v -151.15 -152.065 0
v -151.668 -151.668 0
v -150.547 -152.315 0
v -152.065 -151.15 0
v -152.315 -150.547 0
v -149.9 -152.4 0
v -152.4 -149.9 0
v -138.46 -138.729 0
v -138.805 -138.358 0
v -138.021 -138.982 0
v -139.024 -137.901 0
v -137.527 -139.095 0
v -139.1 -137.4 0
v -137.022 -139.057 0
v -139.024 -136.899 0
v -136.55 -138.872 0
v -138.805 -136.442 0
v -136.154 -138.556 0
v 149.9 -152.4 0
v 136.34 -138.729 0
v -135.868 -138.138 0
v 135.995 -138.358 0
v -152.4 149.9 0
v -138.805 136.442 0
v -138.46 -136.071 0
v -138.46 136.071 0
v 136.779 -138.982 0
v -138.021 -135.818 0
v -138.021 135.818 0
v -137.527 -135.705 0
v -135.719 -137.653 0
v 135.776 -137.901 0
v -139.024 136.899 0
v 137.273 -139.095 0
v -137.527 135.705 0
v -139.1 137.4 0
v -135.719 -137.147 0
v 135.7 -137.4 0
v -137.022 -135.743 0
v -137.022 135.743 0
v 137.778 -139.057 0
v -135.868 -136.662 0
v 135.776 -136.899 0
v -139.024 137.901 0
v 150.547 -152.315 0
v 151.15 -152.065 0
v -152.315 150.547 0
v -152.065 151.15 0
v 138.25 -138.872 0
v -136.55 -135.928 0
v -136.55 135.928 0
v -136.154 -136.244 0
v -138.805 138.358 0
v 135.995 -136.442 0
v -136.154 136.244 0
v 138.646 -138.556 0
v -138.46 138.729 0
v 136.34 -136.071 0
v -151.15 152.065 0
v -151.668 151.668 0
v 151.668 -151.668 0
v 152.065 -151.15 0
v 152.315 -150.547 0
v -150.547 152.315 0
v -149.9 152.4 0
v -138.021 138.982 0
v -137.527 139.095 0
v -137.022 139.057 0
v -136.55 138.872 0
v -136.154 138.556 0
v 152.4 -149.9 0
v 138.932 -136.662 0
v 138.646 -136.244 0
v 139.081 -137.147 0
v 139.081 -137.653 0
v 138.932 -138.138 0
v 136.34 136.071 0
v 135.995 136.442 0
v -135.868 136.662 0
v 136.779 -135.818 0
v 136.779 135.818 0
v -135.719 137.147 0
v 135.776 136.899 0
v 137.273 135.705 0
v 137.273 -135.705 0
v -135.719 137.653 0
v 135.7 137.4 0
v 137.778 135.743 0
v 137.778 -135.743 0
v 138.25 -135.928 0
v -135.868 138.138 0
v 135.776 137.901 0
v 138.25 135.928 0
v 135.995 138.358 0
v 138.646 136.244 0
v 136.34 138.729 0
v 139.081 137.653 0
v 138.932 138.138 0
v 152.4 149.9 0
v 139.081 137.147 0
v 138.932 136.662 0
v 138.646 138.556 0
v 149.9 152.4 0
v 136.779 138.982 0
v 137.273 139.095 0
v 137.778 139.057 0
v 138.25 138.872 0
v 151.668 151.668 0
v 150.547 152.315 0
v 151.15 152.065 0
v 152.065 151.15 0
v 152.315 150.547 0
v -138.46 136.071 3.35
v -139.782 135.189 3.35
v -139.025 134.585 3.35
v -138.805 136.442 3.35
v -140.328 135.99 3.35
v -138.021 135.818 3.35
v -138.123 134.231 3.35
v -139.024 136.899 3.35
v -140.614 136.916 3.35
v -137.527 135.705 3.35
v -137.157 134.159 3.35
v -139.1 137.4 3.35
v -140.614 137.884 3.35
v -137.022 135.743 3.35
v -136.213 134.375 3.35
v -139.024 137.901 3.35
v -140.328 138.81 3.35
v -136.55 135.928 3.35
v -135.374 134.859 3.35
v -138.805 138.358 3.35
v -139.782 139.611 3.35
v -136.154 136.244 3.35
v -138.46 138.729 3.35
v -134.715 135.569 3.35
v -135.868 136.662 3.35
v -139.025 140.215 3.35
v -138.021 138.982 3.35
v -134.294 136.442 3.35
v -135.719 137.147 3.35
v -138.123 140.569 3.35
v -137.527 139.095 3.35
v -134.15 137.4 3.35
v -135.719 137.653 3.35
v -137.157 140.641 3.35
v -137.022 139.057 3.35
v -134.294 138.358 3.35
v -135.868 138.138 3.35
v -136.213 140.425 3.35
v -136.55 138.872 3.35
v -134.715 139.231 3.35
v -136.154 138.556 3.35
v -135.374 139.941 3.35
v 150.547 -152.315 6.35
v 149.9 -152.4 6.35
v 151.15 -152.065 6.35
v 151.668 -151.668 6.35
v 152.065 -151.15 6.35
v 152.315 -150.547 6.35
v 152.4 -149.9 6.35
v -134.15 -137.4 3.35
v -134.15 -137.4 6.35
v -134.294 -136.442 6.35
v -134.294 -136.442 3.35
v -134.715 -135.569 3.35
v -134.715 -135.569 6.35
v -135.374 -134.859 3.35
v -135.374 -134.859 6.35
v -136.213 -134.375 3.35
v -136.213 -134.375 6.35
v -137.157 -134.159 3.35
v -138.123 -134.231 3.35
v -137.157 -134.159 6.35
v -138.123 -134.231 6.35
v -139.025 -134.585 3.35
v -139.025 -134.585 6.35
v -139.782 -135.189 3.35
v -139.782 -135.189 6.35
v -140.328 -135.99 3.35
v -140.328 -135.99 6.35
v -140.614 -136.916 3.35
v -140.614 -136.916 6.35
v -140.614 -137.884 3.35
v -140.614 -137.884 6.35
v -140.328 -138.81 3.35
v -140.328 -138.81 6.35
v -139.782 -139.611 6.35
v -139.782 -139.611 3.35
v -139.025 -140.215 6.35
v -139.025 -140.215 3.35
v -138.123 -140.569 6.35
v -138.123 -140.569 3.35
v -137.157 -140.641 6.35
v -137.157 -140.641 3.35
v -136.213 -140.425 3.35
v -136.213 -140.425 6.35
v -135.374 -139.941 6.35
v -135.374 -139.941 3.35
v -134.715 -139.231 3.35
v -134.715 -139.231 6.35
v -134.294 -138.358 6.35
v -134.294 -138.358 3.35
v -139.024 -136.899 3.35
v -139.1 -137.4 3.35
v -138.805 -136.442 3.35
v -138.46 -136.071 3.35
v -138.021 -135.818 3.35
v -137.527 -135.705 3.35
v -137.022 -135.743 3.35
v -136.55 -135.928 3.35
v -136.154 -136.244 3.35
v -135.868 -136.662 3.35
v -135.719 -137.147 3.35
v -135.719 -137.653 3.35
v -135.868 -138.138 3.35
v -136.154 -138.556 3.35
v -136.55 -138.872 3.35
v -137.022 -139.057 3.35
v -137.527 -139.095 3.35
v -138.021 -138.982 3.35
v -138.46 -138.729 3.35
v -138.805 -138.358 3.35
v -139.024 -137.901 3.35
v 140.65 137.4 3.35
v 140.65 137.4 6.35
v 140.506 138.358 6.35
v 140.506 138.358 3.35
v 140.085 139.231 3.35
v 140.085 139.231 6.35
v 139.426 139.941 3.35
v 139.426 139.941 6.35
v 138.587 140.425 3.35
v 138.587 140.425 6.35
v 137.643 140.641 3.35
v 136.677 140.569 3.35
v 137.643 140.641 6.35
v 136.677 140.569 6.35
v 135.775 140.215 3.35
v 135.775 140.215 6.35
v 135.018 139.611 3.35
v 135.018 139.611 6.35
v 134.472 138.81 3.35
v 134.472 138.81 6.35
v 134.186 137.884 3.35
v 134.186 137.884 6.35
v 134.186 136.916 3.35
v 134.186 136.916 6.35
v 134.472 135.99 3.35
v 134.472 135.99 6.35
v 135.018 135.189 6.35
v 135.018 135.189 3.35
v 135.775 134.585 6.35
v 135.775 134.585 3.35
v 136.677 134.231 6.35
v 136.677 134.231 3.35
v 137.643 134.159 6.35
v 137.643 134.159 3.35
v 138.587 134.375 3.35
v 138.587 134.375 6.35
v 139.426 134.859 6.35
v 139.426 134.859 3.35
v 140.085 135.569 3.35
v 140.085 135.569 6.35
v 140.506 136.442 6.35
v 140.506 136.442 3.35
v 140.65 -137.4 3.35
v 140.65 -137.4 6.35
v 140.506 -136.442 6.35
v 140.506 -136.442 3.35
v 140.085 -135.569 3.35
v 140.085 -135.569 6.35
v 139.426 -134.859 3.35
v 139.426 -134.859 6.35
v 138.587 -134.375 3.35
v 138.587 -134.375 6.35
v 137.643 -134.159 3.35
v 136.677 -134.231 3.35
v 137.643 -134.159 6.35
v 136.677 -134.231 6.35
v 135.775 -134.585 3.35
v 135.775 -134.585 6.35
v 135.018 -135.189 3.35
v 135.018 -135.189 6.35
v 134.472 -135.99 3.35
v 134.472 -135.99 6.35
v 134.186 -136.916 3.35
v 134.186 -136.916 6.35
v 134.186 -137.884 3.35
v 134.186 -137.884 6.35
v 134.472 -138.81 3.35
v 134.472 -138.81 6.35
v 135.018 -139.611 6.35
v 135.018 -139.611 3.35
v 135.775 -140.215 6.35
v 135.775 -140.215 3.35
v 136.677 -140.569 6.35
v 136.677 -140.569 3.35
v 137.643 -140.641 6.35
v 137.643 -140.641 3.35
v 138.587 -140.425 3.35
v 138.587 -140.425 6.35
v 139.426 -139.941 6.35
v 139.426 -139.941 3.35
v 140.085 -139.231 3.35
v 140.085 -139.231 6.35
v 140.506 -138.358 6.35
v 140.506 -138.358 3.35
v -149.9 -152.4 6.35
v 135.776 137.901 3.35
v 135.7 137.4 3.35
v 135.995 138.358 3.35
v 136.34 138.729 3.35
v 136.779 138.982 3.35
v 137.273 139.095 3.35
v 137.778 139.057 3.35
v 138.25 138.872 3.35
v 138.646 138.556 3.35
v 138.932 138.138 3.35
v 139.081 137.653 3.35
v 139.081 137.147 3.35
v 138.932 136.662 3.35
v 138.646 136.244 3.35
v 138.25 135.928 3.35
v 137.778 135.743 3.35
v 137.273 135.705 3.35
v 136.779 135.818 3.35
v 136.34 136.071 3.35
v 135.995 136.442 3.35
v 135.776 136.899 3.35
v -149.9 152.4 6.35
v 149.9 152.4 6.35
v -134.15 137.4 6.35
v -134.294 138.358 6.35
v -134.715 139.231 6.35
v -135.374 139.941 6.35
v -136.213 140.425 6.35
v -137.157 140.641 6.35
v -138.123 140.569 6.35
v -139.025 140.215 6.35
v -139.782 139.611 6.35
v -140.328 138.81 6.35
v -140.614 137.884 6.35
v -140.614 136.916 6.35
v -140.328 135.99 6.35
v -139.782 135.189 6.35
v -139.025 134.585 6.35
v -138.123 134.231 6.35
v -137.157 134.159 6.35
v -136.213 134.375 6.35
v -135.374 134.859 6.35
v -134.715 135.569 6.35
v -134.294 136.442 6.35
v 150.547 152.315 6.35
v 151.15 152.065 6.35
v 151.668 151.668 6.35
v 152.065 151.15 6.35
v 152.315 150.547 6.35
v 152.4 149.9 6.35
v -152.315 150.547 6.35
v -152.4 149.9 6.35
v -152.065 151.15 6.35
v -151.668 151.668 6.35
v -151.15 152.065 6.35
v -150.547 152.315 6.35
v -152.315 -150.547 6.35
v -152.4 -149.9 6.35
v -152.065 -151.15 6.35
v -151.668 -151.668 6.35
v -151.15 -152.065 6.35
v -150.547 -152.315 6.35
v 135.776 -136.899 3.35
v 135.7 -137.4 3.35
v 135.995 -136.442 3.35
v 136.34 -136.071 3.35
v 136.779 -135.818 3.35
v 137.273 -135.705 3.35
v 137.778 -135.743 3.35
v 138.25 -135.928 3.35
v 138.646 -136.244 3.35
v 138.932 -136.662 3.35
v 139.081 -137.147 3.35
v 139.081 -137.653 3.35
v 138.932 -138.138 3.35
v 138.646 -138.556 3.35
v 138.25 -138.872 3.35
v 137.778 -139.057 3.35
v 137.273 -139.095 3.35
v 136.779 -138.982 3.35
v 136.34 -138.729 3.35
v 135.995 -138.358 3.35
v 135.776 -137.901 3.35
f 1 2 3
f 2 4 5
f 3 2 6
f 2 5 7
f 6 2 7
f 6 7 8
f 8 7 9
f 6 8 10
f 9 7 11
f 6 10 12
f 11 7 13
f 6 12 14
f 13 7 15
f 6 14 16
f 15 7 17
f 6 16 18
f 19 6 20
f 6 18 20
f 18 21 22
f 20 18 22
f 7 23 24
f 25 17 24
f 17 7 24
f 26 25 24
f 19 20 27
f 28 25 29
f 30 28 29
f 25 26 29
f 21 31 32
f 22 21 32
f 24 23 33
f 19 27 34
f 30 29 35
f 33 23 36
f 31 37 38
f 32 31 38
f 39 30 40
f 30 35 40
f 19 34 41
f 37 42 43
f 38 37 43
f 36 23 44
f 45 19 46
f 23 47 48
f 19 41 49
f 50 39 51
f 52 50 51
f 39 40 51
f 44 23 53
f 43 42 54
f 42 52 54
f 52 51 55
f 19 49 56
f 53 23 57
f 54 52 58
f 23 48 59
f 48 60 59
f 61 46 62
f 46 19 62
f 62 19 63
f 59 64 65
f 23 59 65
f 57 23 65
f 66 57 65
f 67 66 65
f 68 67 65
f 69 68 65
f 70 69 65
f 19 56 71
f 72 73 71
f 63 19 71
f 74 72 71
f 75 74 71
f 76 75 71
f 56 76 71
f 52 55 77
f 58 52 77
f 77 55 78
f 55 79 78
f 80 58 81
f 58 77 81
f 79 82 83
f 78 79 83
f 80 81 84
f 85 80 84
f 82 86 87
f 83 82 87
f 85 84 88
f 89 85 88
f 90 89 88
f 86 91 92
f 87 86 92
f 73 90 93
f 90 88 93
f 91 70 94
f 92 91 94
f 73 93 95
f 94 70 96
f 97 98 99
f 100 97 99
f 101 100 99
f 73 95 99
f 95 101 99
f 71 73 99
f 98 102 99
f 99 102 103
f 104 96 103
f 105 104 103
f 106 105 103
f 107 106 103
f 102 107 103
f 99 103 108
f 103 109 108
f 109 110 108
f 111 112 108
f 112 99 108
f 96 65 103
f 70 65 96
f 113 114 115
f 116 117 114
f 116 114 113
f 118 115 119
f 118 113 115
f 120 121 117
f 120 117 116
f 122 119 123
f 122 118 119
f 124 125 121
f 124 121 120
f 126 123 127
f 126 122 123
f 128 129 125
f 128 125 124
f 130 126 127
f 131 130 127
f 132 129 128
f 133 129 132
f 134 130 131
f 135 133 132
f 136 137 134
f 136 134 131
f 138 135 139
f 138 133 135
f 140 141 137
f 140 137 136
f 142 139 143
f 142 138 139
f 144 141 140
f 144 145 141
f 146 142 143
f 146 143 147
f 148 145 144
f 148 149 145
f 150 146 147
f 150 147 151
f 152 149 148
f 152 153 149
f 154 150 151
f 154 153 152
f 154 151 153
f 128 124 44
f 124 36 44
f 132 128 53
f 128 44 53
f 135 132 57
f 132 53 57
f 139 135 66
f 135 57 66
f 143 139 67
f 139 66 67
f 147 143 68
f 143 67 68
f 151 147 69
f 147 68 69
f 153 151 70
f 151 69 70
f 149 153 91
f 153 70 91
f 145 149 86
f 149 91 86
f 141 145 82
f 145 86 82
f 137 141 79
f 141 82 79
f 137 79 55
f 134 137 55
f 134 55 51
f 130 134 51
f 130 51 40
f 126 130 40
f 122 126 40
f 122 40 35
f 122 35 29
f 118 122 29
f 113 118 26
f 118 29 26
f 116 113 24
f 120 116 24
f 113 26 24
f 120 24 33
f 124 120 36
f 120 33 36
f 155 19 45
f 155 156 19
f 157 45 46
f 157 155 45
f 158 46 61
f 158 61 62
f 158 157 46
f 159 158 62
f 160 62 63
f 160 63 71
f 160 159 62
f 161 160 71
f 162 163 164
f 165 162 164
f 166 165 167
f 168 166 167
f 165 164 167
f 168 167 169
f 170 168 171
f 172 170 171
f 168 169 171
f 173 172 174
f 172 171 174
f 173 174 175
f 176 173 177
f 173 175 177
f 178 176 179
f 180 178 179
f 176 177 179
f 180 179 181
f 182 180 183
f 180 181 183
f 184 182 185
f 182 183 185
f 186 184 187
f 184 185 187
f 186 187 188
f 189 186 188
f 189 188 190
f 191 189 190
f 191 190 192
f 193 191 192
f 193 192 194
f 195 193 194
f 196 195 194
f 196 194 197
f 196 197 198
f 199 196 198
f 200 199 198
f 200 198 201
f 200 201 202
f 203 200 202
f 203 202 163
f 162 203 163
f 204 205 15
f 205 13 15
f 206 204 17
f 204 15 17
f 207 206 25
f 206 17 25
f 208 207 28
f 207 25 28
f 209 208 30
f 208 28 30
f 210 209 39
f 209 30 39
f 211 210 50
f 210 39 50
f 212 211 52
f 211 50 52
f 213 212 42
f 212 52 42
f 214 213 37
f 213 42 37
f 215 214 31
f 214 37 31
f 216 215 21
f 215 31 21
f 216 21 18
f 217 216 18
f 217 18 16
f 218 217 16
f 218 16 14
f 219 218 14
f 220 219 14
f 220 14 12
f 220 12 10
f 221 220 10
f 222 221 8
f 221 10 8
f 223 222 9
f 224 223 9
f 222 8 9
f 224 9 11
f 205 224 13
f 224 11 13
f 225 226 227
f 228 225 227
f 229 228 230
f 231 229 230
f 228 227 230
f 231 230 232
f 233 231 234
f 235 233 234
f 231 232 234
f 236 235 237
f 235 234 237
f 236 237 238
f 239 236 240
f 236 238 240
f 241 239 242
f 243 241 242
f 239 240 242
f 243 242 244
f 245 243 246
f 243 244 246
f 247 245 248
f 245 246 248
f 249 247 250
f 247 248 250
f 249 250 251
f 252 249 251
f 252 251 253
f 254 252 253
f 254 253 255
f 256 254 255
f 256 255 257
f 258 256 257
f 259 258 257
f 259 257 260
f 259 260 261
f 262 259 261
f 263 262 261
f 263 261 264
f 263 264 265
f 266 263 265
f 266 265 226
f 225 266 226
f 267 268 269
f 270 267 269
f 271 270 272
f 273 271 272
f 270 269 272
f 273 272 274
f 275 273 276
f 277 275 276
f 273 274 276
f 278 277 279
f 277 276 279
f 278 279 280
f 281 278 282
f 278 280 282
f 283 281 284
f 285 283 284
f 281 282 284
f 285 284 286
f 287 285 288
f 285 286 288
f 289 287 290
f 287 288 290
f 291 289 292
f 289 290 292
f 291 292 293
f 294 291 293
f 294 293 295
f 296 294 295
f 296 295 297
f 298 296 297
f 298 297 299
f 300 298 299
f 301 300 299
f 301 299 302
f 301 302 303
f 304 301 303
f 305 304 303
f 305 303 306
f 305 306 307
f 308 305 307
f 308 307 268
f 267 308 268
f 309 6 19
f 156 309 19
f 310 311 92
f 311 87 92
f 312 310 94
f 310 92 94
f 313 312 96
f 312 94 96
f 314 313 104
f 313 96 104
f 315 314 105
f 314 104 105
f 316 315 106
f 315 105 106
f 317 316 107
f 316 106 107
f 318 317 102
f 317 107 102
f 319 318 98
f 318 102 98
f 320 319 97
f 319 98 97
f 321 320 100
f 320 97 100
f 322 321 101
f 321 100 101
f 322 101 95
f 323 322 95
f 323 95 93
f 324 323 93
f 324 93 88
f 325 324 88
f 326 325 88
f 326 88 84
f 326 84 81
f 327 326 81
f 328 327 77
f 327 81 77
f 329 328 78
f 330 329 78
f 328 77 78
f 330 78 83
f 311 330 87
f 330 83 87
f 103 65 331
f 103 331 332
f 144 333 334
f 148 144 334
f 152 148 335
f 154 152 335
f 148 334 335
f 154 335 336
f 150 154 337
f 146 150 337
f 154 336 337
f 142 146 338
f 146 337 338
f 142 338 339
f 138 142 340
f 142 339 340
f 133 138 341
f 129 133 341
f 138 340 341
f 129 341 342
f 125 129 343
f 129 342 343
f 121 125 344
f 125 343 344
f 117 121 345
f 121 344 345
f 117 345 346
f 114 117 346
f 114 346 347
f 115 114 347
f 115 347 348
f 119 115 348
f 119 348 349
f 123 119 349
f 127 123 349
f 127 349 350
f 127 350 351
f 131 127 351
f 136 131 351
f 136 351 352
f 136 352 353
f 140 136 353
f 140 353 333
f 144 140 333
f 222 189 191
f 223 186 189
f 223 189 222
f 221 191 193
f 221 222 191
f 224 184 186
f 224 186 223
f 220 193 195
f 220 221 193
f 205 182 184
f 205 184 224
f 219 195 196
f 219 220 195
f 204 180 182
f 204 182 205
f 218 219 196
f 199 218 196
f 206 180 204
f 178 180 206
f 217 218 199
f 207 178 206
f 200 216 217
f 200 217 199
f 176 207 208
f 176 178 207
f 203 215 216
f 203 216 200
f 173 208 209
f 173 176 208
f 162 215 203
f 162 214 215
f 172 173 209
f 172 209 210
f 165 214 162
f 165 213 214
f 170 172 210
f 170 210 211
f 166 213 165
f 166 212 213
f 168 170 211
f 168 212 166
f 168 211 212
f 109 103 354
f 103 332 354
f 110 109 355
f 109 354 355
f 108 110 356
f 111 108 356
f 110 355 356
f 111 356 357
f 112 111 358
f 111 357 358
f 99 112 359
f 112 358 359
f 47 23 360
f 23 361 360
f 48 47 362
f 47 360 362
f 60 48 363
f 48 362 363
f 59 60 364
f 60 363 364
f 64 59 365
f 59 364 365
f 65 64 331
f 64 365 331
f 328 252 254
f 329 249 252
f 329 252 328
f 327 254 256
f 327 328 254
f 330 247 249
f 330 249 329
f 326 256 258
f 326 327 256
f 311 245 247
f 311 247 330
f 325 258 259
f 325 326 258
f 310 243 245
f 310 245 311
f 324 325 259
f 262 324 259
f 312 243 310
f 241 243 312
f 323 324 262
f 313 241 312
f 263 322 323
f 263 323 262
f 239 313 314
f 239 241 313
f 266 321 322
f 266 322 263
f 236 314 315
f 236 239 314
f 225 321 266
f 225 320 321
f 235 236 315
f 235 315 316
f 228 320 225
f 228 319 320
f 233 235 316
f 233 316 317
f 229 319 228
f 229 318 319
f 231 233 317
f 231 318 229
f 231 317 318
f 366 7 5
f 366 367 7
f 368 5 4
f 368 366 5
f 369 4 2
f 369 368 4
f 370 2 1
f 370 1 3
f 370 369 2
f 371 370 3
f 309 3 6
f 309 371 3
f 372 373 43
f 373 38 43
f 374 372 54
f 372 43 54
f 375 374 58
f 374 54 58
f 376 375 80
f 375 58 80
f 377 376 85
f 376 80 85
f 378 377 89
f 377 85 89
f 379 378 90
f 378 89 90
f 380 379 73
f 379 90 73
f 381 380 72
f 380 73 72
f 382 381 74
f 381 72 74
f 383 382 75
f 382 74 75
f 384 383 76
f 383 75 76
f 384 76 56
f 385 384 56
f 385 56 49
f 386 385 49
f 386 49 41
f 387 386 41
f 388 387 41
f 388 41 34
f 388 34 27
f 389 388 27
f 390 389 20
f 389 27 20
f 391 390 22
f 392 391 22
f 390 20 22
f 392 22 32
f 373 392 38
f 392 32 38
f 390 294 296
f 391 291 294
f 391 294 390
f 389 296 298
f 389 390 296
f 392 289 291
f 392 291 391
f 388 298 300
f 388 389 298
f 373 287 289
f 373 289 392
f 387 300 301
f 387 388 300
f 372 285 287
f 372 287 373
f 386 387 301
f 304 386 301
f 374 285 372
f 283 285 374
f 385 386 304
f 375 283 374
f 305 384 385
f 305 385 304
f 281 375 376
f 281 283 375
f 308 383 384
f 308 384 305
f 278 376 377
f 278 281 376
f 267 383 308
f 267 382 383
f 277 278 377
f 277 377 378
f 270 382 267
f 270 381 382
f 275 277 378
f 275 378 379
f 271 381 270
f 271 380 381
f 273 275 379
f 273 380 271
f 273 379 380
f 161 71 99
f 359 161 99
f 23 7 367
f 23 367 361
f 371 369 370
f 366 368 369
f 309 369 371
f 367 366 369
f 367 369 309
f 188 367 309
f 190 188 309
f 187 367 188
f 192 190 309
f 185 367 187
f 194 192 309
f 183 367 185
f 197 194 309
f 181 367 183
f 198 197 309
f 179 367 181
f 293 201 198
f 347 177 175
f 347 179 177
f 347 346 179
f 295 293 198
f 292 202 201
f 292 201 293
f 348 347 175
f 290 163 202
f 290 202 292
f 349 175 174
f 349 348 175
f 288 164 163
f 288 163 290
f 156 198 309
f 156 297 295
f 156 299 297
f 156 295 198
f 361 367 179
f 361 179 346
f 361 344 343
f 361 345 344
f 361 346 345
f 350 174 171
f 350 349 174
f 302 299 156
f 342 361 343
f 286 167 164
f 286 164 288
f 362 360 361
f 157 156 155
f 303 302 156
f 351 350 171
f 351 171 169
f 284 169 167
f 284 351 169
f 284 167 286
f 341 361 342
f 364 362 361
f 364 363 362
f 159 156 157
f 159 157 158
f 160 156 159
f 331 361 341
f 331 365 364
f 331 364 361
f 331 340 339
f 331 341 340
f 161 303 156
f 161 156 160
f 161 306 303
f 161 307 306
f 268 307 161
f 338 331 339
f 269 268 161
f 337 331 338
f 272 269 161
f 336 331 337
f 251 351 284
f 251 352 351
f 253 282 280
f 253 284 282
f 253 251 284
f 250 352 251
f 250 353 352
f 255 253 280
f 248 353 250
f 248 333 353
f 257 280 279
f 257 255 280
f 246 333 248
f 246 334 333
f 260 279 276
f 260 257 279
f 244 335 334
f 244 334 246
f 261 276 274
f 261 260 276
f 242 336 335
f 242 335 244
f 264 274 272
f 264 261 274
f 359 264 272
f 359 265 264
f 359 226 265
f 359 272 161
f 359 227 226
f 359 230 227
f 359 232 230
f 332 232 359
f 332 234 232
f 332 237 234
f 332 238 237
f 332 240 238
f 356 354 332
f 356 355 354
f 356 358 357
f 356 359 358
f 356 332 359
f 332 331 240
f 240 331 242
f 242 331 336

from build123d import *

# Parameters (mm, degrees)
SKETCH1_W                      = 304.8
SKETCH1_H                      = 304.8
BOSS_EXTRUDE1_DEPTH            = 6.35
CBORE_FOR_M3_SHCS1_D           = 3.4
CBORE_FOR_M3_SHCS1_CBORE_D     = 6.5
CBORE_FOR_M3_SHCS1_CBORE_DEPTH = 3
FILLET1_R                      = 2.5


with BuildPart() as part:
    # Sketch1 → Boss-Extrude1 (new body)
    with BuildSketch(Plane.XY):
        Rectangle(SKETCH1_W, SKETCH1_H)
    extrude(amount=BOSS_EXTRUDE1_DEPTH)

    # CBORE for M3 SHCS1 (through all)
    with Locations(Plane.XY.offset(6.35)):
        with Locations((137.4, 137.4), (-137.4, -137.4), (137.4, -137.4), (-137.4, 137.4)):
            CounterBoreHole(CBORE_FOR_M3_SHCS1_D / 2, CBORE_FOR_M3_SHCS1_CBORE_D / 2, CBORE_FOR_M3_SHCS1_CBORE_DEPTH)

    # Fillet1
    fillet1_edges = [part.edges().sort_by_distance(p)[0] for p in [
        (152.4, -152.4, 3.175),
        (-152.4, -152.4, 3.175),
        (-152.4, 152.4, 3.175),
        (152.4, 152.4, 3.175),
    ]]
    fillet(fillet1_edges, radius=FILLET1_R)


solid = part.part
